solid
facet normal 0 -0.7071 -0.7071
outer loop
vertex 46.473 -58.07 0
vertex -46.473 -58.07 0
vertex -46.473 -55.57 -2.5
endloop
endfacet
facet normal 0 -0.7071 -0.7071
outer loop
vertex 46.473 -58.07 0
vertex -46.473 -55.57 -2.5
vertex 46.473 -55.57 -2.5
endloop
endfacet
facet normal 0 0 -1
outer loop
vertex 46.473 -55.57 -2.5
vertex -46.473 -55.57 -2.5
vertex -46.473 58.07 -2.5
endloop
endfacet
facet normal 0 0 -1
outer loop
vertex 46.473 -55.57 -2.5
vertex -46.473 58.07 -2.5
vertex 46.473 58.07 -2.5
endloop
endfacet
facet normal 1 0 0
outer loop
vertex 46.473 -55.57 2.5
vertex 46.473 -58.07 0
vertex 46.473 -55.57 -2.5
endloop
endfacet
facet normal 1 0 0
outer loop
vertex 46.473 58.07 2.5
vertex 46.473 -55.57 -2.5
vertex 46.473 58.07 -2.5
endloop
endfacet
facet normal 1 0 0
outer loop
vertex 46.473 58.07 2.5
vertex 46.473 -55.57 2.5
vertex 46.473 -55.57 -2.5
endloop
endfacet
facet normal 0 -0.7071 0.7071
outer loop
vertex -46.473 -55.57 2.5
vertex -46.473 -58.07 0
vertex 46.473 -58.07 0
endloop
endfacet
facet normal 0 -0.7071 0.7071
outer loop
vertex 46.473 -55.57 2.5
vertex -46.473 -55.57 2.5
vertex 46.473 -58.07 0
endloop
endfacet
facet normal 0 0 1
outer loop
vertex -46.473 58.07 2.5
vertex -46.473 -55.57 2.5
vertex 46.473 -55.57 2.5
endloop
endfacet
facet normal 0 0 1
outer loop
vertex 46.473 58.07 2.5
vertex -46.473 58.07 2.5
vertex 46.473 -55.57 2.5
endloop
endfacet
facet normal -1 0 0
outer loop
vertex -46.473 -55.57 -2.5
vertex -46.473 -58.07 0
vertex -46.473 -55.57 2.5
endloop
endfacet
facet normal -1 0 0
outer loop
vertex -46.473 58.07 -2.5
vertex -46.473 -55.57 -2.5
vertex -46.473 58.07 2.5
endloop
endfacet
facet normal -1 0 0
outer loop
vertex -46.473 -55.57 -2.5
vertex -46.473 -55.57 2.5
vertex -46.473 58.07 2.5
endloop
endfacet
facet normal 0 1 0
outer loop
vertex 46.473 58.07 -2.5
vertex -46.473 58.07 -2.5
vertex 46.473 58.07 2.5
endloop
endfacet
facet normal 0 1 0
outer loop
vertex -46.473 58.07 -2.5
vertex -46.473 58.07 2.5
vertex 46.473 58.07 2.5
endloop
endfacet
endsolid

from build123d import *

# Parameters (mm, degrees)
F1_W          = 92.9454192519
F1_H          = 116.1409467459
F2_DEPTH      = 2.5
F2_DEPTH_BACK = 2.5
F3_SIZE       = 2.49999
F0_W          = 71.3404193521
F0_H          = 85.4026153684
F4_DEPTH      = 1
F4_DEPTH_BACK = 1


# Not quite as in the source:
# - a fillet or chamfer is up to 0.001 mm smaller than in the source, because OpenCascade refuses the exact size


with BuildPart() as f2:
    # F1 (on face) → F2 (new body, two sides)
    with BuildSketch(Plane.XY) as f2_sk:
        Rectangle(F1_W, F1_H)
    extrude(amount=F2_DEPTH)
    extrude(f2_sk.sketch, amount=-F2_DEPTH_BACK)

    # F3 (size 2.5 in the source; OpenCascade refuses exactly that, so slightly less here)
    f3_edges = [f2.edges().sort_by_distance(p)[0] for p in [
        (0, -58.070473, 2.5),
        (0, -58.070473, -2.5),
    ]]
    chamfer(f3_edges, length=F3_SIZE)

    # F0 (on Top) → F4 (join, two sides)
    with BuildSketch(Plane.XY) as f4_sk:
        Rectangle(F0_W, F0_H)
    extrude(amount=F4_DEPTH)
    extrude(f4_sk.sketch, amount=-F4_DEPTH_BACK)


solid = f2.part
